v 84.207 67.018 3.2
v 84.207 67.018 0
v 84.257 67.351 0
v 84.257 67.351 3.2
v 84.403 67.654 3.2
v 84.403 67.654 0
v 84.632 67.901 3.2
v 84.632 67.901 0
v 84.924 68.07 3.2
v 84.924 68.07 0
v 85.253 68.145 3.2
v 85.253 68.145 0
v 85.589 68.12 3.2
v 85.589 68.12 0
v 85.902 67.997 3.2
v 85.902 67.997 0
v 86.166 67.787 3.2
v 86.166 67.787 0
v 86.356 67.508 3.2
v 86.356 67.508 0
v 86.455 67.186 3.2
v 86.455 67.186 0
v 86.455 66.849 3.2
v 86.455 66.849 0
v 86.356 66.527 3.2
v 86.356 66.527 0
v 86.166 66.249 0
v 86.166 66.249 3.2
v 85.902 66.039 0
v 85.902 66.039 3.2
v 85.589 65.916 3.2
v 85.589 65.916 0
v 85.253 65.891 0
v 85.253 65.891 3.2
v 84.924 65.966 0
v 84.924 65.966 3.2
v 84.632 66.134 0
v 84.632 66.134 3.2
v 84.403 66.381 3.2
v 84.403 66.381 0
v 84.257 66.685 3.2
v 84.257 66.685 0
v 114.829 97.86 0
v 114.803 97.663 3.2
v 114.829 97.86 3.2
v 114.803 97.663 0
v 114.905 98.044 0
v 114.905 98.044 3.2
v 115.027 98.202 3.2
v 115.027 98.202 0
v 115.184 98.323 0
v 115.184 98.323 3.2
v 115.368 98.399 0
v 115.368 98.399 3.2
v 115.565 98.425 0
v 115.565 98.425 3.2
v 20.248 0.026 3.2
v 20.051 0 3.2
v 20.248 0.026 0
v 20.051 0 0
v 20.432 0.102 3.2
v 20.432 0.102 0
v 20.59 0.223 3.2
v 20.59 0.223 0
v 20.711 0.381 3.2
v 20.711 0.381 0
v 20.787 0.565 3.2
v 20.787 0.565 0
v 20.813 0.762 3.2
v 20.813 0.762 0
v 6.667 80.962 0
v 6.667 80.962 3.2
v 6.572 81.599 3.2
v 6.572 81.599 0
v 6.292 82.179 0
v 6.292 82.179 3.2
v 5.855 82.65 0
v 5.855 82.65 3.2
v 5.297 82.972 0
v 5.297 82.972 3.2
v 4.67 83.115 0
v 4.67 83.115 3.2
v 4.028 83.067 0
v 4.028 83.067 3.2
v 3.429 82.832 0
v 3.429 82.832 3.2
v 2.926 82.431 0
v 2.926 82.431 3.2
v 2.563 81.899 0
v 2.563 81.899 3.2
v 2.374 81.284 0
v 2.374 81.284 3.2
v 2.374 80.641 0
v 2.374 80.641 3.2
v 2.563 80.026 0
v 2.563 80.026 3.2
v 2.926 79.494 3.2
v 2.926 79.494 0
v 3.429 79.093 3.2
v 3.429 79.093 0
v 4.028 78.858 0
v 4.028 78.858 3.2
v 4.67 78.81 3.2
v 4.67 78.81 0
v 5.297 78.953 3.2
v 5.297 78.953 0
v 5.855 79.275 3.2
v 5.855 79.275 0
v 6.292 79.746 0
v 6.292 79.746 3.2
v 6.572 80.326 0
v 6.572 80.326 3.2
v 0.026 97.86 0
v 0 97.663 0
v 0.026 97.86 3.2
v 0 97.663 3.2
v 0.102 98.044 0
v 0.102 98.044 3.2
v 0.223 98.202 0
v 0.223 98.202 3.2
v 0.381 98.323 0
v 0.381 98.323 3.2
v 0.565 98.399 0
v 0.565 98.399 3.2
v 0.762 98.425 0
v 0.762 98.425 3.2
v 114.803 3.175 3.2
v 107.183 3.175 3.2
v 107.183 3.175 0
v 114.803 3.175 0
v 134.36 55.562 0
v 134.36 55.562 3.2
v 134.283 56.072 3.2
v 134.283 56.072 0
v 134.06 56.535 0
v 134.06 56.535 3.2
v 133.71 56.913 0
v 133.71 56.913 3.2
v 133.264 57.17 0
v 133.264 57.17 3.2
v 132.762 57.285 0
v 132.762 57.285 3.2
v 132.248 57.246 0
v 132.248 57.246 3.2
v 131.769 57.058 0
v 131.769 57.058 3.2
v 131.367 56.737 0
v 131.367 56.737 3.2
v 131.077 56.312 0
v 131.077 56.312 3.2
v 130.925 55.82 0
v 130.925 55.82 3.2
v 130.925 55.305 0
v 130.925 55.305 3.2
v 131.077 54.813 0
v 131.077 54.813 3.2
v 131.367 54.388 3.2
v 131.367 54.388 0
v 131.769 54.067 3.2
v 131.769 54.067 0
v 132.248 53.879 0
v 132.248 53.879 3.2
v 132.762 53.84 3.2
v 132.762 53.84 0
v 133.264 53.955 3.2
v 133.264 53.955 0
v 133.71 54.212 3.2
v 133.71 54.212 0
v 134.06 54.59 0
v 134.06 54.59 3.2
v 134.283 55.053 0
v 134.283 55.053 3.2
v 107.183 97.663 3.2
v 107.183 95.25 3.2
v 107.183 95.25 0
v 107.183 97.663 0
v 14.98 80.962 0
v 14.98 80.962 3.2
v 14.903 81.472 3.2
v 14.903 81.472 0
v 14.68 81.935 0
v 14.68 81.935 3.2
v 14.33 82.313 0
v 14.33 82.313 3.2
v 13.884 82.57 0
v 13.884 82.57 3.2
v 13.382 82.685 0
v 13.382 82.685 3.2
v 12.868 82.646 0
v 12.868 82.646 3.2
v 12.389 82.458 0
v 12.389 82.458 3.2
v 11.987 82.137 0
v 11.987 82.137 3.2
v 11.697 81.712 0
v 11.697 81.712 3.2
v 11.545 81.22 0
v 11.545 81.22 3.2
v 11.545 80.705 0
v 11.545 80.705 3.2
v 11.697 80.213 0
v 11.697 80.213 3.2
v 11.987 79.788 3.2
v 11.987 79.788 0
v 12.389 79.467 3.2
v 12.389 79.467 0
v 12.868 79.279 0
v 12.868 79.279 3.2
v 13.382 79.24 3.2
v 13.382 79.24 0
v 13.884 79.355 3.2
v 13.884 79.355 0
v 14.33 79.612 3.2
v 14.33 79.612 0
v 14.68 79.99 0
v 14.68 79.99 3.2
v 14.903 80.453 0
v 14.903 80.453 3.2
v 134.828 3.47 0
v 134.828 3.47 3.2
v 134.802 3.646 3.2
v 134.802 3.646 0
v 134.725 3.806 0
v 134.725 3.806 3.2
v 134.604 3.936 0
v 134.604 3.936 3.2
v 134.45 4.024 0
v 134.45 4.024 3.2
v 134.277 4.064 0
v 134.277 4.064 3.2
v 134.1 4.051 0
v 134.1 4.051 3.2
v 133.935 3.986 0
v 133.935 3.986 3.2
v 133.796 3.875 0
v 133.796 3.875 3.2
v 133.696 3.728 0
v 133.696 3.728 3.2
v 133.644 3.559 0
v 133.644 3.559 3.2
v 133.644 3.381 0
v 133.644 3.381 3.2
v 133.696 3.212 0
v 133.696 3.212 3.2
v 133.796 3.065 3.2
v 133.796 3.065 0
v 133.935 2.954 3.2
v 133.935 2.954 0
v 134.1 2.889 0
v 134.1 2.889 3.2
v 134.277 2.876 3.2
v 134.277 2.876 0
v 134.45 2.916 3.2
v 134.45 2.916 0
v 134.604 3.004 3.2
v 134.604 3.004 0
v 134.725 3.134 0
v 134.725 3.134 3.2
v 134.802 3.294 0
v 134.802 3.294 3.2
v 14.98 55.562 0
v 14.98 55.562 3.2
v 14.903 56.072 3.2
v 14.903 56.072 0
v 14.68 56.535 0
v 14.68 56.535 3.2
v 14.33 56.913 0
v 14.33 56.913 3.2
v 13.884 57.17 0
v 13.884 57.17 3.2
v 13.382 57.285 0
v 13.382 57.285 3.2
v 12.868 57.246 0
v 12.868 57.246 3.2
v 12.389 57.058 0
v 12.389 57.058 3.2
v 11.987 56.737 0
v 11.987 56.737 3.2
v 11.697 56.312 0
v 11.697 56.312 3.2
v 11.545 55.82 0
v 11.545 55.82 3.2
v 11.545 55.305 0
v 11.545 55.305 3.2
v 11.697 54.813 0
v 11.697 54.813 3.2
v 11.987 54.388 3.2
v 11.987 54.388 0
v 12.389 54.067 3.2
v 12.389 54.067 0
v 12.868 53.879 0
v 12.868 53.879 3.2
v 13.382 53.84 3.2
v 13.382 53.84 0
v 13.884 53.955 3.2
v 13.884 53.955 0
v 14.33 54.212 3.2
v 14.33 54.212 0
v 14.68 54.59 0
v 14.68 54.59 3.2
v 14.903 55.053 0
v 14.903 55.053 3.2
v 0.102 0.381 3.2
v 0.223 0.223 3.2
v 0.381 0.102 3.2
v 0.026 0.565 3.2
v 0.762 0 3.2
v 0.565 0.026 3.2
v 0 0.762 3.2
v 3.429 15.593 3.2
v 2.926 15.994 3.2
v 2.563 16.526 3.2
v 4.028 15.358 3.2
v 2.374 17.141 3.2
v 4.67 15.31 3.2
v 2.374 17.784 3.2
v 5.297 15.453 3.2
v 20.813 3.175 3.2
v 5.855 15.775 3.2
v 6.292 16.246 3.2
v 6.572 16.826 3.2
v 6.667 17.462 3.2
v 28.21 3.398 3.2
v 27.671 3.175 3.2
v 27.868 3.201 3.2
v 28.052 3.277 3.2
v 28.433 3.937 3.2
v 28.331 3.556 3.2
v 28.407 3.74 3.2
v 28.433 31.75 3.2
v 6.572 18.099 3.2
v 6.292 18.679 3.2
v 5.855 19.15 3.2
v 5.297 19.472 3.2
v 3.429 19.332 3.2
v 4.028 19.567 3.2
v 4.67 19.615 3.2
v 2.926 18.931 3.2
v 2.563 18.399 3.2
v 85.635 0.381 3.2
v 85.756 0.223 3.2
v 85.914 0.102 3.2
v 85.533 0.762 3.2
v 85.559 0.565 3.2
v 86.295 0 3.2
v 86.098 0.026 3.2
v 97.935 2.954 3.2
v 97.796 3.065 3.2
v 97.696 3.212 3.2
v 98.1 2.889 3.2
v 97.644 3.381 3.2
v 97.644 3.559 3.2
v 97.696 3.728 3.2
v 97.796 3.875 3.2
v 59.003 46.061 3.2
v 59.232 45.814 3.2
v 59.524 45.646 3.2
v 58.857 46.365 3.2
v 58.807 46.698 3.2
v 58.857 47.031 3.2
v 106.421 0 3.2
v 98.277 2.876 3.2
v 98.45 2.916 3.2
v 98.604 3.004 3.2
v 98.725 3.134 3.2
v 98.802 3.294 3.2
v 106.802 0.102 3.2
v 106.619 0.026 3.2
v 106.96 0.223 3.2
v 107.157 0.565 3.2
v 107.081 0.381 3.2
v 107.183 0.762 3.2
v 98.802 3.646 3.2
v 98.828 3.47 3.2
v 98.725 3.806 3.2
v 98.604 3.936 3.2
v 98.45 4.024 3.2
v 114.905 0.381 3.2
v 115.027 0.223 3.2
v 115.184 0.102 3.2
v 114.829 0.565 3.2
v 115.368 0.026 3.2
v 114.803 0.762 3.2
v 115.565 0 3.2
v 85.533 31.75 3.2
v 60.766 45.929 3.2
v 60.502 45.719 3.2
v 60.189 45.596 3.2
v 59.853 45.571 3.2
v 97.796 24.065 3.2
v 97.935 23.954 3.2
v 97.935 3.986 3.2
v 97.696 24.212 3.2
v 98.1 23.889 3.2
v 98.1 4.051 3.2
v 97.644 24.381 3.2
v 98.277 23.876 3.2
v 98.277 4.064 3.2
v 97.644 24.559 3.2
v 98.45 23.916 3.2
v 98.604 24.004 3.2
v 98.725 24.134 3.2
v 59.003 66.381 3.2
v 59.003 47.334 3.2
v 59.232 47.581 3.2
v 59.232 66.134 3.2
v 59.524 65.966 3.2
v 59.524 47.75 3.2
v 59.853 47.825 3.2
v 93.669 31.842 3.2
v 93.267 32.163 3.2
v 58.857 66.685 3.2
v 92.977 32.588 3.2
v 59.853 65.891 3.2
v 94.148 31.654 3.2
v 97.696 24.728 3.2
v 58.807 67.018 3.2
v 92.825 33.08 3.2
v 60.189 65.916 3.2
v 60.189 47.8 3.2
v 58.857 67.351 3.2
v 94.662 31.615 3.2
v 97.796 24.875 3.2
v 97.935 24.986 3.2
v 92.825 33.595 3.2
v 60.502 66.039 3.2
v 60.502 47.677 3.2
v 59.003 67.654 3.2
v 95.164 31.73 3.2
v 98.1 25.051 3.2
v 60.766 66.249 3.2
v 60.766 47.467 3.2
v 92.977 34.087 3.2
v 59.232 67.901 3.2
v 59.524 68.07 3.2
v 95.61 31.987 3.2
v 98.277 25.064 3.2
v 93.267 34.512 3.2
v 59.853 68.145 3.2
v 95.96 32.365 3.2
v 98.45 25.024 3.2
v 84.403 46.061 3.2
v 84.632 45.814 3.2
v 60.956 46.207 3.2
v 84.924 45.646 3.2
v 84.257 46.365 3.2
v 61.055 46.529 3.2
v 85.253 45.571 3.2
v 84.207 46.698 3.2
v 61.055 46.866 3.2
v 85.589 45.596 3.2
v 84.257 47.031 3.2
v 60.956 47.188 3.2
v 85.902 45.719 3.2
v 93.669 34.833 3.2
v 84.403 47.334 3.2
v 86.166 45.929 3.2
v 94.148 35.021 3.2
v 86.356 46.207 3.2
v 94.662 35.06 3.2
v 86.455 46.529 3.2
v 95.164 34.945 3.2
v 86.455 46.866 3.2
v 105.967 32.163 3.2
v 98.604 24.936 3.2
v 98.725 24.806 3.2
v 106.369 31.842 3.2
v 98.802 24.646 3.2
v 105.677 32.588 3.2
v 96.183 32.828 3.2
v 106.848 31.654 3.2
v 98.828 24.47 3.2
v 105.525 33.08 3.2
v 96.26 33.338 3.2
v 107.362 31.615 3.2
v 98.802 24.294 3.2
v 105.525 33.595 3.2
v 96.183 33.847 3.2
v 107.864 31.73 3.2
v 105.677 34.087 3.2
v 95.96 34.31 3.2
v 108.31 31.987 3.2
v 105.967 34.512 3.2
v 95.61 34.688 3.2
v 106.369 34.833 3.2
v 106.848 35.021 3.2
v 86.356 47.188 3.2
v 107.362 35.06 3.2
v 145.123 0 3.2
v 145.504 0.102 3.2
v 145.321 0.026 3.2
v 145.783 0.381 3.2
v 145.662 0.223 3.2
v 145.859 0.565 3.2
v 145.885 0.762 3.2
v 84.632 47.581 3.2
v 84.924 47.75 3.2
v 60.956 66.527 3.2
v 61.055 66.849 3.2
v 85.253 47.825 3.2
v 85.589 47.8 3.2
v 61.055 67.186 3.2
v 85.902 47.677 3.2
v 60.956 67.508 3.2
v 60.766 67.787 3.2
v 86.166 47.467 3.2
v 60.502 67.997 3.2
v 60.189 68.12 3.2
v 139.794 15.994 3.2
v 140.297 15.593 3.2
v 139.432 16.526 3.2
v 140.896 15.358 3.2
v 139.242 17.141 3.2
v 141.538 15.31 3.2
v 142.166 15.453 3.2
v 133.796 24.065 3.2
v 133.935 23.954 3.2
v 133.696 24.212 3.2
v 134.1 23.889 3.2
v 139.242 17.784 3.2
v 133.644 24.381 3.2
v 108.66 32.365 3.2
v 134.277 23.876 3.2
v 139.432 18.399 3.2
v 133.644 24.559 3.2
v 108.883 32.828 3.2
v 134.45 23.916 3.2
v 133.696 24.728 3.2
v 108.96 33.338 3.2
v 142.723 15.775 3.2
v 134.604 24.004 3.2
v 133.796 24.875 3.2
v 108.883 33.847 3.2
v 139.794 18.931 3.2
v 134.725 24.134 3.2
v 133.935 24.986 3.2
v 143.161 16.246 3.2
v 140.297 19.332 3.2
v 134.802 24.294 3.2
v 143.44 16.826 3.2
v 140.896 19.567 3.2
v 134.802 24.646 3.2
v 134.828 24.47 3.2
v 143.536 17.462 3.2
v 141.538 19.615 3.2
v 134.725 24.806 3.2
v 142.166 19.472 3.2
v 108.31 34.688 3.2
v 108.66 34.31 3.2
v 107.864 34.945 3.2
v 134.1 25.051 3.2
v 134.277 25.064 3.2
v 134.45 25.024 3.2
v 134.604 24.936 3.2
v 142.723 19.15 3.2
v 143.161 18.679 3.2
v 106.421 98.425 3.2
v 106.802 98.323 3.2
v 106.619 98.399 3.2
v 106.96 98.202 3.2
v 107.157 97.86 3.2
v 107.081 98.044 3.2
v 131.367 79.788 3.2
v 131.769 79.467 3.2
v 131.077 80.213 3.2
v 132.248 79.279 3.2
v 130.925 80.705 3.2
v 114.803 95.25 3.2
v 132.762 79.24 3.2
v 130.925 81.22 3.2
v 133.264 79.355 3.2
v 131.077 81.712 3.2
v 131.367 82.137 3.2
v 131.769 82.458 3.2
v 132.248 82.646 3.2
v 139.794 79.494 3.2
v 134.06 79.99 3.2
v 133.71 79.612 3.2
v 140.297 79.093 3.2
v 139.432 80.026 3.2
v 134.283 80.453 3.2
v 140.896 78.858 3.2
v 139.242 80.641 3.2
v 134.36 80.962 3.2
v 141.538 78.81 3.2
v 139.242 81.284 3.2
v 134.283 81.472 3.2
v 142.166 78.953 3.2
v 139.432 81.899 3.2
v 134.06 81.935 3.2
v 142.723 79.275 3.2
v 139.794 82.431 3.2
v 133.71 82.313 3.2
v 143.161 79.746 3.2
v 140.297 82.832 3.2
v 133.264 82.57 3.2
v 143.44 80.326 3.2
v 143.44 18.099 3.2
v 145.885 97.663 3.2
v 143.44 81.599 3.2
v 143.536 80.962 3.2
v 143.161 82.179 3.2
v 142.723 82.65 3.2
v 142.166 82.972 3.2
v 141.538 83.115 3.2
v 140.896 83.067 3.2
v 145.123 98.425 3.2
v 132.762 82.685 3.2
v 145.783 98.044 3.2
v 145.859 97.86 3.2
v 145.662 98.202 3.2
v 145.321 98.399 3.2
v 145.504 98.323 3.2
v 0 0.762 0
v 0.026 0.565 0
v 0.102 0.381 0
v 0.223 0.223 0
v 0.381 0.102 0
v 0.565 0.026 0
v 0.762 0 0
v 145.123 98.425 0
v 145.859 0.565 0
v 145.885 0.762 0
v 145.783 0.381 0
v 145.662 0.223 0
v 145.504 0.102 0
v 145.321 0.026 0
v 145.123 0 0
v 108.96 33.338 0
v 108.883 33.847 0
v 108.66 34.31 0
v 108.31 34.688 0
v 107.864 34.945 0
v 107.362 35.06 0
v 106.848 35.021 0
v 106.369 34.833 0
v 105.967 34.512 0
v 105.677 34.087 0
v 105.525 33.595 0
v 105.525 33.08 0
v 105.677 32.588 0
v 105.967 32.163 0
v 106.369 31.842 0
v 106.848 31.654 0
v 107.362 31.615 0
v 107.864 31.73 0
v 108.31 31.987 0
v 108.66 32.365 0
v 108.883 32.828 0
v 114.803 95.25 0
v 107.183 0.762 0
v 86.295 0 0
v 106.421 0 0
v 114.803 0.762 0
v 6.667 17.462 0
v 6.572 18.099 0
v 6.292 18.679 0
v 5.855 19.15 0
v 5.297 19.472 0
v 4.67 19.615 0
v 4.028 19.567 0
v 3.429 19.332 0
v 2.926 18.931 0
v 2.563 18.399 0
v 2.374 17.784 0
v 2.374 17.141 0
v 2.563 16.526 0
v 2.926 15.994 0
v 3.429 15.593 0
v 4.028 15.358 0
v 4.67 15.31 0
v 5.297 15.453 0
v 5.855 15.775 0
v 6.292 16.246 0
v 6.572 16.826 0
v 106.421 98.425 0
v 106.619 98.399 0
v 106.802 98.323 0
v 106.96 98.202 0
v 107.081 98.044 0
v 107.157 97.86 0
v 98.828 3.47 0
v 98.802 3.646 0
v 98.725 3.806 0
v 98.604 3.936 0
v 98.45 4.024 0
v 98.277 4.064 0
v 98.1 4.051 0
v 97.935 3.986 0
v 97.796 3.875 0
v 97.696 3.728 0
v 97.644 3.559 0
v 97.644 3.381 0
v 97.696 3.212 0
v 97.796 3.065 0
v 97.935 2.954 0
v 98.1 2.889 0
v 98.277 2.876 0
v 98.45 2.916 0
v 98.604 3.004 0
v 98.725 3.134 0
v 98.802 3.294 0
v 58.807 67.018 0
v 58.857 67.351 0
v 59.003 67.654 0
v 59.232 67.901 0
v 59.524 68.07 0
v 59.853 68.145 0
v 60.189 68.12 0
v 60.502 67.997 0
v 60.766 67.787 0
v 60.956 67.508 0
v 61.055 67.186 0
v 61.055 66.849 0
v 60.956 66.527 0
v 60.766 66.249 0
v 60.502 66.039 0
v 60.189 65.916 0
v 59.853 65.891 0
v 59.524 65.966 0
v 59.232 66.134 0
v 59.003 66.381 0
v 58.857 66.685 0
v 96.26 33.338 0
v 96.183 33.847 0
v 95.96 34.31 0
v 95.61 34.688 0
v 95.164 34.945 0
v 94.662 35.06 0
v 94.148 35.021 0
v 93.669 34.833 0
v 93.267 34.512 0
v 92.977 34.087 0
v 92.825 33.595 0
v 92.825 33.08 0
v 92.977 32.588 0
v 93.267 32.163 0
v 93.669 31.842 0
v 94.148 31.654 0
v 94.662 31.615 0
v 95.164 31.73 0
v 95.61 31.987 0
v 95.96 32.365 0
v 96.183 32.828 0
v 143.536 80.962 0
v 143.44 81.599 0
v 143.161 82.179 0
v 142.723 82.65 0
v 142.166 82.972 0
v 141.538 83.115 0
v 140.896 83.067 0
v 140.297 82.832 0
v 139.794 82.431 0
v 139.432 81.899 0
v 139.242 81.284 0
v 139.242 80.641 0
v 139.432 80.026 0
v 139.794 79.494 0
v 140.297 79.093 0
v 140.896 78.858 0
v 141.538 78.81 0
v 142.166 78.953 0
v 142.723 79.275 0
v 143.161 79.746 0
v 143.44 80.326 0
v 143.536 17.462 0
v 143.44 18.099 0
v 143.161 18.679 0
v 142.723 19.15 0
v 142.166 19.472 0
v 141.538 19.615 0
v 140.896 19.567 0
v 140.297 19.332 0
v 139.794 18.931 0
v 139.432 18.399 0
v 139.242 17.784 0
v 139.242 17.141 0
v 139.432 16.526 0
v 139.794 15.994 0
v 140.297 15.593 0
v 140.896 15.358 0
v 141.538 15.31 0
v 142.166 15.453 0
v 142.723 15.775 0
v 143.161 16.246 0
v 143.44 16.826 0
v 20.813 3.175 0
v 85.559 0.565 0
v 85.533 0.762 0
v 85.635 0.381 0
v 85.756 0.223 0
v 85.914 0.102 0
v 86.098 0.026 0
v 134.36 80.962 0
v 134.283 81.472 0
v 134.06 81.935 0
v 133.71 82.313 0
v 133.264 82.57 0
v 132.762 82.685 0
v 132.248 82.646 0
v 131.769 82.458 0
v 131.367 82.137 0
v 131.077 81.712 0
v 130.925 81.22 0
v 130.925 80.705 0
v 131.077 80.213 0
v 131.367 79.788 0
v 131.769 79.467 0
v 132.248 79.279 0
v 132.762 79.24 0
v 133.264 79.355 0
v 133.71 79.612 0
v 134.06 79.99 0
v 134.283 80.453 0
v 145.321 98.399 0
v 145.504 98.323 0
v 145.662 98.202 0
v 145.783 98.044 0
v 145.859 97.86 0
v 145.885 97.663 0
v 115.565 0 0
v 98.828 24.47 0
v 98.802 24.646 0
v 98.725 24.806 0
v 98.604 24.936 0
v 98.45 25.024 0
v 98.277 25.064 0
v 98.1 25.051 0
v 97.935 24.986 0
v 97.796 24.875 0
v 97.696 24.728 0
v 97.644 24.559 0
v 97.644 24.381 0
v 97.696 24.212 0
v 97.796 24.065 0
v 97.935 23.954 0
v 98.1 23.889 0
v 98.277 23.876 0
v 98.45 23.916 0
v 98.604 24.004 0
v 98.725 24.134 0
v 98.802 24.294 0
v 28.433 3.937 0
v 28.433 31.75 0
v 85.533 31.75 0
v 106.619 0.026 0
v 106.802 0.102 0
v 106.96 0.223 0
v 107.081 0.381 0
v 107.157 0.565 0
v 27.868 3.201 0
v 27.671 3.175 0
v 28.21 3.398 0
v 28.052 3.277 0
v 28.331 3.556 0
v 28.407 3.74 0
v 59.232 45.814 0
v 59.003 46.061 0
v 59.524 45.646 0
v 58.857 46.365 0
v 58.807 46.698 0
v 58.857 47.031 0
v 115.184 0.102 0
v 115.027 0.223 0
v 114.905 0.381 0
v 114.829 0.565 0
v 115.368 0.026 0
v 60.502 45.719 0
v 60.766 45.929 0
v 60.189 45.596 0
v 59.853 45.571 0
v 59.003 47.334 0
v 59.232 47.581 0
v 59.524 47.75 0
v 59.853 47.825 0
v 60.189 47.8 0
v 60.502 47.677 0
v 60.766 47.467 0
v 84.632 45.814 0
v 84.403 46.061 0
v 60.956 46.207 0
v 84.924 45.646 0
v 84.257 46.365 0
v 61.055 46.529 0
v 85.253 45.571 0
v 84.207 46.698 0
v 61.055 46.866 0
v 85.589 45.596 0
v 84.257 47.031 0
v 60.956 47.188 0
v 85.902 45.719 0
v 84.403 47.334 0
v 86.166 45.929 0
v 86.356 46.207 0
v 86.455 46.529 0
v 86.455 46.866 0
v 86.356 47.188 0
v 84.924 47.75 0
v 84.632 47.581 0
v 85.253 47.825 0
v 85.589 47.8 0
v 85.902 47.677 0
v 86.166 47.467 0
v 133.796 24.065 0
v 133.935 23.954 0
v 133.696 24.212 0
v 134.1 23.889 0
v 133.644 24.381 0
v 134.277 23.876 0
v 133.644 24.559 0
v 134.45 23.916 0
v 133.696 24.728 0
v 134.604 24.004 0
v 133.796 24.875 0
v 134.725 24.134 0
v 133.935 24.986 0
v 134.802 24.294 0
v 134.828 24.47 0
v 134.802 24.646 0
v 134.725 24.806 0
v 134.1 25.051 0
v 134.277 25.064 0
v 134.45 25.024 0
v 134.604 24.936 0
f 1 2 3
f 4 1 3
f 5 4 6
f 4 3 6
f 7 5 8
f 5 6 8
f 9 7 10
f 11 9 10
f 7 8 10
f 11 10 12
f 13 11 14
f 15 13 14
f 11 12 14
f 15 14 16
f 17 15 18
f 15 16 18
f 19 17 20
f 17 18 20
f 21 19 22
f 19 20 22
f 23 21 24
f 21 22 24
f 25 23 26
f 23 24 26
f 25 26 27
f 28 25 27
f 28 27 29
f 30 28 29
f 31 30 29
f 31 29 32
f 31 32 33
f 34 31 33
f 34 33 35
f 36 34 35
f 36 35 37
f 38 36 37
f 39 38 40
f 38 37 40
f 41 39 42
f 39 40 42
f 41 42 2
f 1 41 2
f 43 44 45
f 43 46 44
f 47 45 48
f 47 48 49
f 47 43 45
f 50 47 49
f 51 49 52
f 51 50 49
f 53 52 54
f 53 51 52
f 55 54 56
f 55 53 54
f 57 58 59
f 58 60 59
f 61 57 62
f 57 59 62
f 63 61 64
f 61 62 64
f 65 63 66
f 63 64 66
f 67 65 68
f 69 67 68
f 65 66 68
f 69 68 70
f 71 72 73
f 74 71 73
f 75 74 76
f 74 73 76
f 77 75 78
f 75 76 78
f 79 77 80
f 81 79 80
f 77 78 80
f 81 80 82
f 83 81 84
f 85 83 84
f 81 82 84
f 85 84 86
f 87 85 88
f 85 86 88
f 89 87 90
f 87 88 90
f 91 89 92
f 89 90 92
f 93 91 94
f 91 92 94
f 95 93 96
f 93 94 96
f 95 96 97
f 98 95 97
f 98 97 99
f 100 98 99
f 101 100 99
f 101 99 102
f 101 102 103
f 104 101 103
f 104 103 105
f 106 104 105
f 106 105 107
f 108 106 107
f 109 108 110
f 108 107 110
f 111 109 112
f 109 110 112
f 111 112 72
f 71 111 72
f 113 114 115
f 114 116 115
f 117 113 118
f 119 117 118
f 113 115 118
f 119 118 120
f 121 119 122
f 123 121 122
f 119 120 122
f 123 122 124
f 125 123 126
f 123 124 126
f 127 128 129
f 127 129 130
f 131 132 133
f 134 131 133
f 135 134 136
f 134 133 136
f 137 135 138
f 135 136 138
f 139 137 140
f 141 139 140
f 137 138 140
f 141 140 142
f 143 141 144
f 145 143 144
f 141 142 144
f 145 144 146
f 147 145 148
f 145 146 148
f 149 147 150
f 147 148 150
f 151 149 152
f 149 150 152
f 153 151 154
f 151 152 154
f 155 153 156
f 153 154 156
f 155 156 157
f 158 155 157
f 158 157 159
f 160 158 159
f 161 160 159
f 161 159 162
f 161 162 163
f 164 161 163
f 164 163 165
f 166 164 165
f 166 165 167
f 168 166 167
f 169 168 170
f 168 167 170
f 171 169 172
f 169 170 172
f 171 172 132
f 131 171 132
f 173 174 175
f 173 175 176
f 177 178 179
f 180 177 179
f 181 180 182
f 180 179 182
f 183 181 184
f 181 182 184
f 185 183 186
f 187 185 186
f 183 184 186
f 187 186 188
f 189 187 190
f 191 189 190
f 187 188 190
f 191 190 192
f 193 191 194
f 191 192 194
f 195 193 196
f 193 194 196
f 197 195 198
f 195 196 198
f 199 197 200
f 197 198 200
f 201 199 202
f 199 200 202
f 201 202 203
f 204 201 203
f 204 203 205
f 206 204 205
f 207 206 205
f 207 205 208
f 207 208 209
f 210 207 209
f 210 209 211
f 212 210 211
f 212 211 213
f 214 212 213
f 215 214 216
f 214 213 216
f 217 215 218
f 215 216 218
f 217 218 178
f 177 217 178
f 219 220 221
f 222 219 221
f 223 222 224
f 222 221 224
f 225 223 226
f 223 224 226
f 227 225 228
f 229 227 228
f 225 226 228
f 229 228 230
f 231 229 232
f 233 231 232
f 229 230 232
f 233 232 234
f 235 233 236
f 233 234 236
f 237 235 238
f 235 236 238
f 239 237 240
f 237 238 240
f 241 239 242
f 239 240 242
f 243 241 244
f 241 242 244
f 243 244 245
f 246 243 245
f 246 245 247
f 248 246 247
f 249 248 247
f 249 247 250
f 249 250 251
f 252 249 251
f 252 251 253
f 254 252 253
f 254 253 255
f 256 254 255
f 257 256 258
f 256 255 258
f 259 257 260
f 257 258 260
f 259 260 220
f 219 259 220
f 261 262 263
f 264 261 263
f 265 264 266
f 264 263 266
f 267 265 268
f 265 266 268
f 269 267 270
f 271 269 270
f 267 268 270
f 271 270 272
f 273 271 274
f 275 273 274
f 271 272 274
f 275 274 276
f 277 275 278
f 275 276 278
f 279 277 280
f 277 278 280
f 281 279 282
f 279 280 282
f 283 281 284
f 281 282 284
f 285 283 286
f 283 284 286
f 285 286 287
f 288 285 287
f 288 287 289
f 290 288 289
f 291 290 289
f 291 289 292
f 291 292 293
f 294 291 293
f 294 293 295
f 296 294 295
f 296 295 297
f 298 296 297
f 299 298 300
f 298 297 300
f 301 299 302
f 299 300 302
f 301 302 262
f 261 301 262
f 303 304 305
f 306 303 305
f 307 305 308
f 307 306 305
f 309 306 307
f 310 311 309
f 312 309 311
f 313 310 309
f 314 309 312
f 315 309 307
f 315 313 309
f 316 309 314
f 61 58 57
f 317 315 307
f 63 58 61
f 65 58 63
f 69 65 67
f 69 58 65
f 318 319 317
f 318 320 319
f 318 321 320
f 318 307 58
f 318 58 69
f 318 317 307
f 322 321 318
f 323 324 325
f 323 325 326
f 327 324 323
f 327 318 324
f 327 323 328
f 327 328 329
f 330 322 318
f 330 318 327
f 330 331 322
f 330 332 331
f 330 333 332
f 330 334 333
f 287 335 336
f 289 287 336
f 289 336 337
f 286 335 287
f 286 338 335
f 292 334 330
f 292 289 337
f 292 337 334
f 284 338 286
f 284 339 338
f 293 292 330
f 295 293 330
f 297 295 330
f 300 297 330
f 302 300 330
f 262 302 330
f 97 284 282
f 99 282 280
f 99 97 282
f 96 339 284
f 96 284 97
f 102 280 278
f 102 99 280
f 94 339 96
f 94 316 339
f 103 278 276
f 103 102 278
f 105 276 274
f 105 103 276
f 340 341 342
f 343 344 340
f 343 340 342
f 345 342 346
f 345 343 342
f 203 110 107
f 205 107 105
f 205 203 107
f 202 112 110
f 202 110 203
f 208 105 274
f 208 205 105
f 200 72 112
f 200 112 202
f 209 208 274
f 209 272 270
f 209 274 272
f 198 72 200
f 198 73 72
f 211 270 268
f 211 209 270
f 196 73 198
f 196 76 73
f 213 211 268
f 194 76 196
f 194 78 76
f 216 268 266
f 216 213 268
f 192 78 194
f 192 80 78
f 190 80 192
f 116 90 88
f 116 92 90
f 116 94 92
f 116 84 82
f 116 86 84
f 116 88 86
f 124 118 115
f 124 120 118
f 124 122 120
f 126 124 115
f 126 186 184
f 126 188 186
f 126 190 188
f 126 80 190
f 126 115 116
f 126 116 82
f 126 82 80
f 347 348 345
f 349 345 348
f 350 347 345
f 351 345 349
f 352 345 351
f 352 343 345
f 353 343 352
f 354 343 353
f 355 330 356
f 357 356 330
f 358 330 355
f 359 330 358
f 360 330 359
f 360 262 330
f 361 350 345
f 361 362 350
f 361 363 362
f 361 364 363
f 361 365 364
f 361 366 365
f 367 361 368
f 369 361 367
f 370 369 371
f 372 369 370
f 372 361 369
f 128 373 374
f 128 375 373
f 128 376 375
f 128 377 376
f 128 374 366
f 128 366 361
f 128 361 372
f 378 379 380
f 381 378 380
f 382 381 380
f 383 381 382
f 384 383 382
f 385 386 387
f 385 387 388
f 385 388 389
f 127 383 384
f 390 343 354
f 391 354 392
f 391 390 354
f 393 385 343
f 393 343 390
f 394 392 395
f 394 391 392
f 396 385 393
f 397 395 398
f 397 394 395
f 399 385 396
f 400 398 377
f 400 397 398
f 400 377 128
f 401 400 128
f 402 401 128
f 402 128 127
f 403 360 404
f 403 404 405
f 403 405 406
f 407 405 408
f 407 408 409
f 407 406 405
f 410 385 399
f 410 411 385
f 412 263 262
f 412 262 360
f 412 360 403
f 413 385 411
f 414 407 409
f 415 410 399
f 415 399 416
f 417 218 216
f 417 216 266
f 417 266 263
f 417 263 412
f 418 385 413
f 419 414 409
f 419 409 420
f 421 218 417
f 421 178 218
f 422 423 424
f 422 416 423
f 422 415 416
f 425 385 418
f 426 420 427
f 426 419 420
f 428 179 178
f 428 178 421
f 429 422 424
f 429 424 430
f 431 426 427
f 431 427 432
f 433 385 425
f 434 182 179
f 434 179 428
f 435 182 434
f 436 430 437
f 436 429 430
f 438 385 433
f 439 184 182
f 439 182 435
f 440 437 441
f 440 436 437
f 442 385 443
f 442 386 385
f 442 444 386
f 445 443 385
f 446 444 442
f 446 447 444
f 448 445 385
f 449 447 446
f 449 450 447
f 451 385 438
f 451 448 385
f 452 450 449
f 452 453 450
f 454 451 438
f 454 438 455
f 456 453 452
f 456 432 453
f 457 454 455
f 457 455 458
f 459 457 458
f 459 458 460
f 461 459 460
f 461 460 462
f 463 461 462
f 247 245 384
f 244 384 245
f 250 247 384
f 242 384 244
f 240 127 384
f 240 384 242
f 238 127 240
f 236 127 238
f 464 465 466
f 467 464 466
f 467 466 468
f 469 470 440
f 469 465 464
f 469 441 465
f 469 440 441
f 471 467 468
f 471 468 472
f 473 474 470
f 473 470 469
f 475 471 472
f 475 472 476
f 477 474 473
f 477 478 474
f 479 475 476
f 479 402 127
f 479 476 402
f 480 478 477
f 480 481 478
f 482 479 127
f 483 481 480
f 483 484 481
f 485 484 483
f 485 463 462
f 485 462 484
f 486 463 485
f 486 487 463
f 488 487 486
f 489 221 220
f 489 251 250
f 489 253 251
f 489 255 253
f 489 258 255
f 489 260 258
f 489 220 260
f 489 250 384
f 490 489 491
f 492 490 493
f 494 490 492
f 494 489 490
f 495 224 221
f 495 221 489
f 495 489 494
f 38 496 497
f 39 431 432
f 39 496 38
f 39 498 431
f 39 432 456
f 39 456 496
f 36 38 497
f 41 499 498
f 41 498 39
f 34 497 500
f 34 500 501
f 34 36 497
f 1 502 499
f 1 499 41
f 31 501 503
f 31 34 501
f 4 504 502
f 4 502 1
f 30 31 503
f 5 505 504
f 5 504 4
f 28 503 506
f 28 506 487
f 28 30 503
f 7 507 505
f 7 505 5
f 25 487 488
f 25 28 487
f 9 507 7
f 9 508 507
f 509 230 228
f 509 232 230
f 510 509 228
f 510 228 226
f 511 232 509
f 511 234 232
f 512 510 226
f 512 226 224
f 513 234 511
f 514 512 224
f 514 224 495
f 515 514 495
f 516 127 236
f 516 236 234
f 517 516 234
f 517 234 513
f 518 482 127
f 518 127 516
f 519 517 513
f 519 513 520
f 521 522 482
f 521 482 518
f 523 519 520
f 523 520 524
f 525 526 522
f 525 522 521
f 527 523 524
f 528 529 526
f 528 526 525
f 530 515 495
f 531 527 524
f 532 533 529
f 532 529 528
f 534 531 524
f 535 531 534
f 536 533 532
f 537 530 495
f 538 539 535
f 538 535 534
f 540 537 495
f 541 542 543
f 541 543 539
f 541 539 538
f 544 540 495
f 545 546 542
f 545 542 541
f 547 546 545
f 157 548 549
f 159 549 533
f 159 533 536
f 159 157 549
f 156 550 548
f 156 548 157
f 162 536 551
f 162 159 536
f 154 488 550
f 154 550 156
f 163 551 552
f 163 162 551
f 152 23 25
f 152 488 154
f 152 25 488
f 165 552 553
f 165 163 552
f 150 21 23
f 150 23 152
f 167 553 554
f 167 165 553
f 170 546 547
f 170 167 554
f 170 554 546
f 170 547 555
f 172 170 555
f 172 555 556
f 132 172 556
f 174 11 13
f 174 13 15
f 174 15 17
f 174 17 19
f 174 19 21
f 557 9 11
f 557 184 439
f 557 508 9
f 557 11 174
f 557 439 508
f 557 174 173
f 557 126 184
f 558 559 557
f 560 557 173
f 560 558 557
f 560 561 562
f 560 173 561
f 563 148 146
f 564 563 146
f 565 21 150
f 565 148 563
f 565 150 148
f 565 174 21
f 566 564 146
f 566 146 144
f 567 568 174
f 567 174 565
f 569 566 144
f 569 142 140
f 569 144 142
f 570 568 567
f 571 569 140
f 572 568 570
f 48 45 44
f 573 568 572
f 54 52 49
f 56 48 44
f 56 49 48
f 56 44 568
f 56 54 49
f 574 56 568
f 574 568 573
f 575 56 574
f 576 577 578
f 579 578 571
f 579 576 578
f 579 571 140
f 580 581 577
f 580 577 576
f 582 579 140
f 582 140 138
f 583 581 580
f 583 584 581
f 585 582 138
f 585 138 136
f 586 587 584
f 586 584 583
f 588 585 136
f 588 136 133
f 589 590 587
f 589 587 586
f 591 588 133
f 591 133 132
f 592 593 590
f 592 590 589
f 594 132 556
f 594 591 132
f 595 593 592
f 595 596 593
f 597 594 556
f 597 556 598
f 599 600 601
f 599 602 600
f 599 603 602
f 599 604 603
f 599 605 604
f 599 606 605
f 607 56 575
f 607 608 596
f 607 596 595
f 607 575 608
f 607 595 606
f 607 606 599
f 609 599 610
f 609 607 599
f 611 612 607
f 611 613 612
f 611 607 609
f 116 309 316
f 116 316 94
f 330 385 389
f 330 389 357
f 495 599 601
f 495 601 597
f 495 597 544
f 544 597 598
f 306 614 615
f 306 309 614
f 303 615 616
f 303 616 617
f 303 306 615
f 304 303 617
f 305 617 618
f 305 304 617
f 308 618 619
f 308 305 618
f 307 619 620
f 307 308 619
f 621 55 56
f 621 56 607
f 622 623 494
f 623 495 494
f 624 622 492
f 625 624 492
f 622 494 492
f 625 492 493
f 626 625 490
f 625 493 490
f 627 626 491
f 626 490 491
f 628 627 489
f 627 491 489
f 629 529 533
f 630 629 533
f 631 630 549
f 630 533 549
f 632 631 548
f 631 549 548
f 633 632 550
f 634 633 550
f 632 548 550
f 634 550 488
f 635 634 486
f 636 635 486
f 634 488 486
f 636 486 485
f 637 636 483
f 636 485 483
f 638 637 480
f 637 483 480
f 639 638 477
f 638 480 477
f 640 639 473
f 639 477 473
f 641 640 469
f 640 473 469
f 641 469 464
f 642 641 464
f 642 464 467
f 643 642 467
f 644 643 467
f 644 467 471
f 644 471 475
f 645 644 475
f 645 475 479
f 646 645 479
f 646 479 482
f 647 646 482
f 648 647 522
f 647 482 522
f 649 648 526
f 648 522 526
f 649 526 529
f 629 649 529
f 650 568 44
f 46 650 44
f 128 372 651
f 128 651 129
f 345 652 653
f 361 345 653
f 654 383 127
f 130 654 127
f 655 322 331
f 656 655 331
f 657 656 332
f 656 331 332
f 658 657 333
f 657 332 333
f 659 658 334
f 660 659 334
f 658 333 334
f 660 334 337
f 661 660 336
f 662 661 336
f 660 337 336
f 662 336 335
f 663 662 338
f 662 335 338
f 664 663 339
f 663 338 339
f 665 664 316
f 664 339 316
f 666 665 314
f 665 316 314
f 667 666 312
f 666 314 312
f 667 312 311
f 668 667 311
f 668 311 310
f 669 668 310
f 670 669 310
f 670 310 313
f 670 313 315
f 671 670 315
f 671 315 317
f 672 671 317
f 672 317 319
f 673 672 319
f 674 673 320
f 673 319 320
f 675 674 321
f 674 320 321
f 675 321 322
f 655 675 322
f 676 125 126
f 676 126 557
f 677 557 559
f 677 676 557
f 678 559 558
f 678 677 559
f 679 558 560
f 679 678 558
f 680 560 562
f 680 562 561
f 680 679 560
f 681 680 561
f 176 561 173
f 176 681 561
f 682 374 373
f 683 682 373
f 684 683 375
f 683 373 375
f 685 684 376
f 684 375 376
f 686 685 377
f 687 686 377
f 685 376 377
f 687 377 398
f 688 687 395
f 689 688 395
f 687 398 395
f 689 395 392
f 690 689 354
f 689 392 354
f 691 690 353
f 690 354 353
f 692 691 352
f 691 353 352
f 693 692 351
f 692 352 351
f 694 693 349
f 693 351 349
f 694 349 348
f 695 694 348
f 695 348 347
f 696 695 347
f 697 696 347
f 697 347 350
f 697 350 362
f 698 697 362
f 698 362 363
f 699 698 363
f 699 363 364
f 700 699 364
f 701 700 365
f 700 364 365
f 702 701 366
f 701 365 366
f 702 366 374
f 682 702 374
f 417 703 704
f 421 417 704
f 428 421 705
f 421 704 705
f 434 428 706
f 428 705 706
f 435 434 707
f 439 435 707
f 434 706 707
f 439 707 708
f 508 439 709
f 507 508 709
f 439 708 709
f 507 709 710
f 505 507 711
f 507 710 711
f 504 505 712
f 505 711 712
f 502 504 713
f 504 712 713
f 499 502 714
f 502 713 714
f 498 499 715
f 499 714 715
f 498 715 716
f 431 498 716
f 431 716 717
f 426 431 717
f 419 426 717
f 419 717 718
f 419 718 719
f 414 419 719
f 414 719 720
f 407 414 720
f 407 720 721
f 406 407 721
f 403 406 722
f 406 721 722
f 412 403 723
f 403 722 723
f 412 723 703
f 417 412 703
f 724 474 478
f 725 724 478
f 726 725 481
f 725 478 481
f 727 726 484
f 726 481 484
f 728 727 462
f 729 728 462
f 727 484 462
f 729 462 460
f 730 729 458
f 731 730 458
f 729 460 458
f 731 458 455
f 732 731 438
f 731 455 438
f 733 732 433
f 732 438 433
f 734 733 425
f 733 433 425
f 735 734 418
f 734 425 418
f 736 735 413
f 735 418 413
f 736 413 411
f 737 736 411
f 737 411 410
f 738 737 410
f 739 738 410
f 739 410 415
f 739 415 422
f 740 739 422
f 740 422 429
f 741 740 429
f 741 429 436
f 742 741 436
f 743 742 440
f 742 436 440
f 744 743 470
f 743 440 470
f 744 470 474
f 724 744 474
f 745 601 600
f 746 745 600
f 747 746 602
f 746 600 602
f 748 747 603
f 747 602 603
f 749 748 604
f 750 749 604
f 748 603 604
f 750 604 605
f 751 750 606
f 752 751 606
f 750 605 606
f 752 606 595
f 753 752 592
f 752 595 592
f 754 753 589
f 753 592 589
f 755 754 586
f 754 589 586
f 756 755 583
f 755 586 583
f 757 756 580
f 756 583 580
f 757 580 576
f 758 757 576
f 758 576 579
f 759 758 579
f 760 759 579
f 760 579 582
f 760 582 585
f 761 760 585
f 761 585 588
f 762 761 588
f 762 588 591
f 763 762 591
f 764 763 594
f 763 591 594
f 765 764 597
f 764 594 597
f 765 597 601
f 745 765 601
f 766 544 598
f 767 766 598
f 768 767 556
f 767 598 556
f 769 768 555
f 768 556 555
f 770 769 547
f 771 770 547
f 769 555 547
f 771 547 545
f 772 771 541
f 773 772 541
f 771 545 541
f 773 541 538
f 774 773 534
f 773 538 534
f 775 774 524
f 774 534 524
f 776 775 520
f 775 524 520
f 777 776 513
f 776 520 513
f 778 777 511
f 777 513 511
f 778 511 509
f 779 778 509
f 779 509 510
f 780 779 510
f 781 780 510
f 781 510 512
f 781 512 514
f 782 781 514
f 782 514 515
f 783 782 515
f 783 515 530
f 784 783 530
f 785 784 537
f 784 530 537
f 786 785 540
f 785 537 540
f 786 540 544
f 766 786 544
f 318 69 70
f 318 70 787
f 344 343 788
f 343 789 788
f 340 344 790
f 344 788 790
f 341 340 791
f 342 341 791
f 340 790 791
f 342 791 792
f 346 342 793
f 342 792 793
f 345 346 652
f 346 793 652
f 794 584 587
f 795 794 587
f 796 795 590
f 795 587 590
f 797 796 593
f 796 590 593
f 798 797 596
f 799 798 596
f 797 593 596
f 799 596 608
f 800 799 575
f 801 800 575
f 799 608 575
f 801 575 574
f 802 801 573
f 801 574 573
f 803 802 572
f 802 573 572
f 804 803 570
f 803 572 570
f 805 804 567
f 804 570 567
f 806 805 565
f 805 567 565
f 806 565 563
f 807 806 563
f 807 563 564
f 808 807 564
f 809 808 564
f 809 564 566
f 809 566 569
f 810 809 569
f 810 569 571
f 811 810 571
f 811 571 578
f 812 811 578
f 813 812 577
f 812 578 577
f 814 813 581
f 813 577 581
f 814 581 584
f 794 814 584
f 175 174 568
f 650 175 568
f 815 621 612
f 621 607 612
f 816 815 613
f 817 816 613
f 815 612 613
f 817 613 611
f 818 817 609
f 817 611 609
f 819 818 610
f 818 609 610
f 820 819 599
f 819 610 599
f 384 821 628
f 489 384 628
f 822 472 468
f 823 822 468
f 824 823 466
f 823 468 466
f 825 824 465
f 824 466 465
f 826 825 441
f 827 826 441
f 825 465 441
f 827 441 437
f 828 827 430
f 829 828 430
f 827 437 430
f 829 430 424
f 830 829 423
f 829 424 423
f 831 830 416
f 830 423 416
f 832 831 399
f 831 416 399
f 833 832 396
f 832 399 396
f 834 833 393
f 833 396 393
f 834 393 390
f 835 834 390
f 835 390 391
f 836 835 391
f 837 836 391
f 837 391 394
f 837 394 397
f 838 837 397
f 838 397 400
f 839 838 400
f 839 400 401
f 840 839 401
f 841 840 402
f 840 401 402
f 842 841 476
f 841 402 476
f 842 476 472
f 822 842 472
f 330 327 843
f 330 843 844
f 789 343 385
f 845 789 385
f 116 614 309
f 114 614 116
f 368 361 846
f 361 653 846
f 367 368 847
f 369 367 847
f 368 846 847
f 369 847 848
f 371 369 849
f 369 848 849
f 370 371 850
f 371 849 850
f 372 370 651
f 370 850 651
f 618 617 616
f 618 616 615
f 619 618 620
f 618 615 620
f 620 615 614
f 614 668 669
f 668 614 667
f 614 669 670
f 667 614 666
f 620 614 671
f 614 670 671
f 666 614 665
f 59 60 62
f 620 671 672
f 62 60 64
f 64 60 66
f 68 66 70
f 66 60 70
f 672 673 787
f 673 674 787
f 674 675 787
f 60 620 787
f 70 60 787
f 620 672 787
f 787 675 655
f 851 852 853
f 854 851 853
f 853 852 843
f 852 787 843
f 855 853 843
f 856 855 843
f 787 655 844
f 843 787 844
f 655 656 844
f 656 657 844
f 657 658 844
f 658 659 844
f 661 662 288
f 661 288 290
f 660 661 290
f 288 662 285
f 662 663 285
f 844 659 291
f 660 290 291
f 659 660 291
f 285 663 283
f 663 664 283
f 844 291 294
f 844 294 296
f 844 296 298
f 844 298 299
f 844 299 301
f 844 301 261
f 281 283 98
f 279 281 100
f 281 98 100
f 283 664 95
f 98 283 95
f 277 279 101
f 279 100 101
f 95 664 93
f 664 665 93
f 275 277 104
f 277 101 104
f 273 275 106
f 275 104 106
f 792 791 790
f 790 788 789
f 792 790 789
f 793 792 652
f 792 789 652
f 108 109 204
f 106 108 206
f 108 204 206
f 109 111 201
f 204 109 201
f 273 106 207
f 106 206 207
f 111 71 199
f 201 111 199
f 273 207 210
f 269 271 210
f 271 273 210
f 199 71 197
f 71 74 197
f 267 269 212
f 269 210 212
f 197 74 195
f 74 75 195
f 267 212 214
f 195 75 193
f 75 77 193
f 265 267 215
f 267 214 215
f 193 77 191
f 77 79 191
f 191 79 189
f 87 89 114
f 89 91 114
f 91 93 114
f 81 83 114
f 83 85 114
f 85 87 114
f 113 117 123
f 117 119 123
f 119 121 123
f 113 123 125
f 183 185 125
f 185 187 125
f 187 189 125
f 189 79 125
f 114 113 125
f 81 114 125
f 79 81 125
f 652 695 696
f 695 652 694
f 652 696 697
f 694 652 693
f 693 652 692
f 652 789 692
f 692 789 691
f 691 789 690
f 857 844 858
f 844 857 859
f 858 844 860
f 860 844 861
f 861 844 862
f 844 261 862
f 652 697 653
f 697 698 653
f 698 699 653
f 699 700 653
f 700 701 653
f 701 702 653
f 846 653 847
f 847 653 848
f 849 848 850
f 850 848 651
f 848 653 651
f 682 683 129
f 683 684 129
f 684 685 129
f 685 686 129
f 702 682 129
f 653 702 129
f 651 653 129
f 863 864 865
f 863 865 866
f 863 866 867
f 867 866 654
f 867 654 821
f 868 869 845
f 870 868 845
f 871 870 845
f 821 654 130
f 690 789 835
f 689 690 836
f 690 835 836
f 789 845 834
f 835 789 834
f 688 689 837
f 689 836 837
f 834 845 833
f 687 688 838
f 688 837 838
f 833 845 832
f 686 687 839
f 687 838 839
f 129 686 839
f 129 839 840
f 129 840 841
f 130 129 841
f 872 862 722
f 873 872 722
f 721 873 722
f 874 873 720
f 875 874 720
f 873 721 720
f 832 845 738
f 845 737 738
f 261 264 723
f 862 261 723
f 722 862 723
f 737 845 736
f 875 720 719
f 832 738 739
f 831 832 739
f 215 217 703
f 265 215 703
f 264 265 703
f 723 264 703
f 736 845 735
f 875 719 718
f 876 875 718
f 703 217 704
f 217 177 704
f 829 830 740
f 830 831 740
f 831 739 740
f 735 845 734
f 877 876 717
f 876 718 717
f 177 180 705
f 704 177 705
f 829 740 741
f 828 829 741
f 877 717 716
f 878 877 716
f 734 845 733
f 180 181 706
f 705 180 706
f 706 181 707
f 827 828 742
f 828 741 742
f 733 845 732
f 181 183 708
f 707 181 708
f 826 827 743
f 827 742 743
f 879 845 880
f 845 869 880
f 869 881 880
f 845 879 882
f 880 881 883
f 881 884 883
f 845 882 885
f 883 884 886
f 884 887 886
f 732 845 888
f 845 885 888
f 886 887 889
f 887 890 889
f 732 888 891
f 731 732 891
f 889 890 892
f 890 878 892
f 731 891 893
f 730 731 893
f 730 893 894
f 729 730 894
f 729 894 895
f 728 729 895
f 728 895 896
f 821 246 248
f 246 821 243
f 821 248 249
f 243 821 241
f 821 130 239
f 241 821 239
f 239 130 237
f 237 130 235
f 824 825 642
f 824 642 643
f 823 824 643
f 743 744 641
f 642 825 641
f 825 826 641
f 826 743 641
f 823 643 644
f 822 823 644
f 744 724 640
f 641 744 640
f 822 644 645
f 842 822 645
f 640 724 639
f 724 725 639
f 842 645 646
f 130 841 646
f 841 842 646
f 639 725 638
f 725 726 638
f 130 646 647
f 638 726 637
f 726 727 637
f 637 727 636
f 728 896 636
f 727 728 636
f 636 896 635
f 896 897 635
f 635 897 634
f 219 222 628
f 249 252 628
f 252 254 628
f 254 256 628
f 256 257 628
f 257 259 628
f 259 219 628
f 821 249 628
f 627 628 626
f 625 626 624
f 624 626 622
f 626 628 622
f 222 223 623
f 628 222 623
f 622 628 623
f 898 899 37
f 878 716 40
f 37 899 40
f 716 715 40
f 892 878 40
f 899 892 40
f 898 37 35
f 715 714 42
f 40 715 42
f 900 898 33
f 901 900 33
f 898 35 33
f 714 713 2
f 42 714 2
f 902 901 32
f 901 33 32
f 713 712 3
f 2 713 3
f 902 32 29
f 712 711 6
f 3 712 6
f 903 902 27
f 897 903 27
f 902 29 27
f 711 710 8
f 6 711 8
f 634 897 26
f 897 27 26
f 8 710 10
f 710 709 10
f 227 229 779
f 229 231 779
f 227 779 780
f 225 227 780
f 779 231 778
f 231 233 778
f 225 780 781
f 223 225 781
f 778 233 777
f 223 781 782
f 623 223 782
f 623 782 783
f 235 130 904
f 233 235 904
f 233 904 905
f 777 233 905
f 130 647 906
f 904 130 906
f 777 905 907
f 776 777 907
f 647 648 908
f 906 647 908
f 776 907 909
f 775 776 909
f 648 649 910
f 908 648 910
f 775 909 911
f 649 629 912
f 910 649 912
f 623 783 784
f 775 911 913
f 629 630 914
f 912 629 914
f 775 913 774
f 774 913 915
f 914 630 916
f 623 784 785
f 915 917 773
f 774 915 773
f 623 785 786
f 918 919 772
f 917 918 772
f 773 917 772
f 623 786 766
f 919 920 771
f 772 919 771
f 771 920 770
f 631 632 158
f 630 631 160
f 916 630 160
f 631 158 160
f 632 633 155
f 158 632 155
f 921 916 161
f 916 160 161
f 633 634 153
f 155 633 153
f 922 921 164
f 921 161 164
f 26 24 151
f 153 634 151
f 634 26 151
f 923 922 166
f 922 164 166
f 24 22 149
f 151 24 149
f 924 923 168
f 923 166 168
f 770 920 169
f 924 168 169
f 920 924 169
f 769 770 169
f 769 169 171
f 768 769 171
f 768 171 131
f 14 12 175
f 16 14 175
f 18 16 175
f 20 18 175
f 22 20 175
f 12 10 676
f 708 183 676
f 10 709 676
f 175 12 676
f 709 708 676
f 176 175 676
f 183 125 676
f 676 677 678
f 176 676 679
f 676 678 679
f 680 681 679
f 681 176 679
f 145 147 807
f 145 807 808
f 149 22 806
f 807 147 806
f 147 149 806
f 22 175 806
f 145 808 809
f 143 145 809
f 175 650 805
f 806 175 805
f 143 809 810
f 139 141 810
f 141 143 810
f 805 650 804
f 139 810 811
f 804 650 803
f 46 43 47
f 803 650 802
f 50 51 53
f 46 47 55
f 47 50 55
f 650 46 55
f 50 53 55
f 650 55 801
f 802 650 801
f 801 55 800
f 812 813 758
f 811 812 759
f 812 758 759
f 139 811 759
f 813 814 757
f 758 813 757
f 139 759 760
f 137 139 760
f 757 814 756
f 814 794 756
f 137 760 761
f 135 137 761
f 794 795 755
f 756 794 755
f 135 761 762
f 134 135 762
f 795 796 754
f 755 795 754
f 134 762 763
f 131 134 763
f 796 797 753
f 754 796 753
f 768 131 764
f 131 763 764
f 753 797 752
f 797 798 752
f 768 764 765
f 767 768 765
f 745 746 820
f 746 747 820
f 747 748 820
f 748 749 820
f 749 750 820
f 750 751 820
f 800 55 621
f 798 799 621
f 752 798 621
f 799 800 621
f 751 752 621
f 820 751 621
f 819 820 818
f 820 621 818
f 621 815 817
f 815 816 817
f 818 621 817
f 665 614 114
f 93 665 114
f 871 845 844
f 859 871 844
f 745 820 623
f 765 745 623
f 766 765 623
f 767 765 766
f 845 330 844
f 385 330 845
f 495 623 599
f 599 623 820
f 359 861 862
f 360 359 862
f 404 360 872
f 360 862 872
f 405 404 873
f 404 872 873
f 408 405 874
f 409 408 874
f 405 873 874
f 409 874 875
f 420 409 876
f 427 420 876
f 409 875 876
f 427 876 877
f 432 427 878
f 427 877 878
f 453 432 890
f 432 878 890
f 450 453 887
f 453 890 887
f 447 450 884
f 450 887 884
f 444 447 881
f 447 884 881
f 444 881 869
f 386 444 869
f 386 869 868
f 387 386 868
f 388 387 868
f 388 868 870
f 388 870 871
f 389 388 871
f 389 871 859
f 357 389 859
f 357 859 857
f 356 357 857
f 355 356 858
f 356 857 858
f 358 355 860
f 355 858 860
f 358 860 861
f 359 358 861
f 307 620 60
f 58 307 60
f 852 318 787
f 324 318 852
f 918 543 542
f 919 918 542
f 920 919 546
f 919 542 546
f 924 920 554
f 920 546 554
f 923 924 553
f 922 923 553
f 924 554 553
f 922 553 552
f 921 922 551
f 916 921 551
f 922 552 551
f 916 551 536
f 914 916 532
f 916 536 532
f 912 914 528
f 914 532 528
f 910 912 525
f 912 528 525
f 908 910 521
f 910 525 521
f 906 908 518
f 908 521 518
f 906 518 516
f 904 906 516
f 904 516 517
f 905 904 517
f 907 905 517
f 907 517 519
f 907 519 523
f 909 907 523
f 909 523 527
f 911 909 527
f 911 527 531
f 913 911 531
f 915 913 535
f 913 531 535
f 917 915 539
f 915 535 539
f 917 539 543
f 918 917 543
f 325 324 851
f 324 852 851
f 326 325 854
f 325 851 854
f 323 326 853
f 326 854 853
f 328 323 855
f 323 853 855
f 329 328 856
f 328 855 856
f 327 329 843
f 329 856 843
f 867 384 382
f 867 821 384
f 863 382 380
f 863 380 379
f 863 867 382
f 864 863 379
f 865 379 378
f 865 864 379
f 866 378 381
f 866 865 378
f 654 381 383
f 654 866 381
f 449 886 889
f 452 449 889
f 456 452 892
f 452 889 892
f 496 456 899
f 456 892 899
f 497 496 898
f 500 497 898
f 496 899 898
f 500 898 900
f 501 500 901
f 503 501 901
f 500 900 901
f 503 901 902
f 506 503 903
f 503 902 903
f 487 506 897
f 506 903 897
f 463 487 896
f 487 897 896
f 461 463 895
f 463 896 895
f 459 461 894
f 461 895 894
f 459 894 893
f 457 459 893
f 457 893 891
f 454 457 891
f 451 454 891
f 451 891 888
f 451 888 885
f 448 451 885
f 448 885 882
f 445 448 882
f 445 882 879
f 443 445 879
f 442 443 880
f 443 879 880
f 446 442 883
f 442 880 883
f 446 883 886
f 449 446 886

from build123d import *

# Parameters (mm, degrees)
SKETCH1_W           = 145.885353282
SKETCH1_H           = 98.425
BOSS_EXTRUDE1_DEPTH = 3.2004
SKETCH4_W           = 57.100000132
SKETCH4_H           = 31.75
CUT_EXTRUDE1_DEPTH  = 3.2004
SKETCH5_R           = 2.159
CUT_EXTRUDE2_DEPTH  = 3.2004
SKETCH7_R           = 1.1303
CUT_EXTRUDE3_DEPTH  = 3.2004
SKETCH9_W           = 7.62
SKETCH9_H           = 3.175
CUT_EXTRUDE5_DEPTH  = 3.2004
SKETCH10_R          = 0.59563
CUT_EXTRUDE6_DEPTH  = 3.2004
FILLET1_R           = 0.762
SKETCH11_R          = 1.7272
CUT_EXTRUDE7_DEPTH  = 3.2004


with BuildPart() as part:
    # Sketch1 → Boss-Extrude1 (new body)
    with BuildSketch(Plane.XY):
        with Locations((72.942676641, 49.2125)):
            Rectangle(SKETCH1_W, SKETCH1_H)
    extrude(amount=BOSS_EXTRUDE1_DEPTH)

    # Sketch4 → Cut-Extrude1 (cut)
    with BuildSketch(Plane.XY.offset(3.2004)):
        with Locations((56.982760066, 15.875)):
            Rectangle(SKETCH4_W, SKETCH4_H)
    extrude(amount=-CUT_EXTRUDE1_DEPTH, mode=Mode.SUBTRACT)

    # Sketch5 → Cut-Extrude2 (cut)
    with BuildSketch(Plane.XY.offset(3.2004)):
        with Locations((141.376853282, 80.9625)):
            Circle(SKETCH5_R)
        with Locations((141.376853282, 17.4625)):
            Circle(SKETCH5_R)
        with Locations((4.5085, 17.4625)):
            Circle(SKETCH5_R)
        with Locations((4.5085, 80.9625)):
            Circle(SKETCH5_R)
    extrude(amount=-CUT_EXTRUDE2_DEPTH, mode=Mode.SUBTRACT)

    # Sketch7 → Cut-Extrude3 (cut)
    with BuildSketch(Plane(origin=(0, 0, 0), x_dir=(-1, 0, 0), z_dir=(0, 0, -1))):
        with Locations((-59.937161658, 67.017728802)):
            Circle(SKETCH7_R)
        with Locations((-59.937161658, 46.697728802)):
            Circle(SKETCH7_R)
        with Locations((-85.337161658, 46.697728802)):
            Circle(SKETCH7_R)
        with Locations((-85.337161658, 67.017728802)):
            Circle(SKETCH7_R)
    extrude(amount=-CUT_EXTRUDE3_DEPTH, mode=Mode.SUBTRACT)

    # Sketch9 → Cut-Extrude5 (cut)
    with BuildSketch(Plane.XY.offset(3.2004)):
        with Locations((110.993373282, 96.8375)):
            Rectangle(SKETCH9_W, SKETCH9_H)
        with Locations((110.993373282, 1.5875)):
            Rectangle(SKETCH9_W, SKETCH9_H)
        with Locations((24.62276, 1.5875)):
            Rectangle(SKETCH9_W, SKETCH9_H)
    extrude(amount=-CUT_EXTRUDE5_DEPTH, mode=Mode.SUBTRACT)

    # Sketch10 → Cut-Extrude6 (cut)
    with BuildSketch(Plane.XY.offset(3.2004)):
        with Locations((98.232760132, 24.47)):
            Circle(SKETCH10_R)
        with Locations((134.232760132, 24.47)):
            Circle(SKETCH10_R)
        with Locations((98.232760132, 3.47)):
            Circle(SKETCH10_R)
        with Locations((134.232760132, 3.47)):
            Circle(SKETCH10_R)
    extrude(amount=-CUT_EXTRUDE6_DEPTH, mode=Mode.SUBTRACT)

    # Fillet1
    fillet1_edges = [part.edges().sort_by_distance(p)[0] for p in [
        (85.532760132, 0, 1.6002),
        (0, 98.425, 1.6002),
        (145.885353282, 98.425, 1.6002),
        (145.885353282, 0, 1.6002),
        (0, 0, 1.6002),
        (114.803373282, 98.425, 1.6002),
        (107.183373282, 98.425, 1.6002),
        (114.803373282, 0, 1.6002),
        (107.183373282, 0, 1.6002),
        (28.43276, 3.175, 1.6002),
        (20.81276, 0, 1.6002),
    ]]
    fillet(fillet1_edges, radius=FILLET1_R)

    # Sketch11 → Cut-Extrude7 (cut)
    with BuildSketch(Plane.XY.offset(3.2004)):
        with Locations((13.252676641, 55.5625)):
            Circle(SKETCH11_R)
        with Locations((13.252676641, 80.9625)):
            Circle(SKETCH11_R)
        with Locations((132.632676641, 55.5625)):
            Circle(SKETCH11_R)
        with Locations((132.632676641, 80.9625)):
            Circle(SKETCH11_R)
        with Locations((107.232676641, 33.3375)):
            Circle(SKETCH11_R)
        with Locations((94.532676641, 33.3375)):
            Circle(SKETCH11_R)
    extrude(amount=-CUT_EXTRUDE7_DEPTH, mode=Mode.SUBTRACT)


solid = part.part
